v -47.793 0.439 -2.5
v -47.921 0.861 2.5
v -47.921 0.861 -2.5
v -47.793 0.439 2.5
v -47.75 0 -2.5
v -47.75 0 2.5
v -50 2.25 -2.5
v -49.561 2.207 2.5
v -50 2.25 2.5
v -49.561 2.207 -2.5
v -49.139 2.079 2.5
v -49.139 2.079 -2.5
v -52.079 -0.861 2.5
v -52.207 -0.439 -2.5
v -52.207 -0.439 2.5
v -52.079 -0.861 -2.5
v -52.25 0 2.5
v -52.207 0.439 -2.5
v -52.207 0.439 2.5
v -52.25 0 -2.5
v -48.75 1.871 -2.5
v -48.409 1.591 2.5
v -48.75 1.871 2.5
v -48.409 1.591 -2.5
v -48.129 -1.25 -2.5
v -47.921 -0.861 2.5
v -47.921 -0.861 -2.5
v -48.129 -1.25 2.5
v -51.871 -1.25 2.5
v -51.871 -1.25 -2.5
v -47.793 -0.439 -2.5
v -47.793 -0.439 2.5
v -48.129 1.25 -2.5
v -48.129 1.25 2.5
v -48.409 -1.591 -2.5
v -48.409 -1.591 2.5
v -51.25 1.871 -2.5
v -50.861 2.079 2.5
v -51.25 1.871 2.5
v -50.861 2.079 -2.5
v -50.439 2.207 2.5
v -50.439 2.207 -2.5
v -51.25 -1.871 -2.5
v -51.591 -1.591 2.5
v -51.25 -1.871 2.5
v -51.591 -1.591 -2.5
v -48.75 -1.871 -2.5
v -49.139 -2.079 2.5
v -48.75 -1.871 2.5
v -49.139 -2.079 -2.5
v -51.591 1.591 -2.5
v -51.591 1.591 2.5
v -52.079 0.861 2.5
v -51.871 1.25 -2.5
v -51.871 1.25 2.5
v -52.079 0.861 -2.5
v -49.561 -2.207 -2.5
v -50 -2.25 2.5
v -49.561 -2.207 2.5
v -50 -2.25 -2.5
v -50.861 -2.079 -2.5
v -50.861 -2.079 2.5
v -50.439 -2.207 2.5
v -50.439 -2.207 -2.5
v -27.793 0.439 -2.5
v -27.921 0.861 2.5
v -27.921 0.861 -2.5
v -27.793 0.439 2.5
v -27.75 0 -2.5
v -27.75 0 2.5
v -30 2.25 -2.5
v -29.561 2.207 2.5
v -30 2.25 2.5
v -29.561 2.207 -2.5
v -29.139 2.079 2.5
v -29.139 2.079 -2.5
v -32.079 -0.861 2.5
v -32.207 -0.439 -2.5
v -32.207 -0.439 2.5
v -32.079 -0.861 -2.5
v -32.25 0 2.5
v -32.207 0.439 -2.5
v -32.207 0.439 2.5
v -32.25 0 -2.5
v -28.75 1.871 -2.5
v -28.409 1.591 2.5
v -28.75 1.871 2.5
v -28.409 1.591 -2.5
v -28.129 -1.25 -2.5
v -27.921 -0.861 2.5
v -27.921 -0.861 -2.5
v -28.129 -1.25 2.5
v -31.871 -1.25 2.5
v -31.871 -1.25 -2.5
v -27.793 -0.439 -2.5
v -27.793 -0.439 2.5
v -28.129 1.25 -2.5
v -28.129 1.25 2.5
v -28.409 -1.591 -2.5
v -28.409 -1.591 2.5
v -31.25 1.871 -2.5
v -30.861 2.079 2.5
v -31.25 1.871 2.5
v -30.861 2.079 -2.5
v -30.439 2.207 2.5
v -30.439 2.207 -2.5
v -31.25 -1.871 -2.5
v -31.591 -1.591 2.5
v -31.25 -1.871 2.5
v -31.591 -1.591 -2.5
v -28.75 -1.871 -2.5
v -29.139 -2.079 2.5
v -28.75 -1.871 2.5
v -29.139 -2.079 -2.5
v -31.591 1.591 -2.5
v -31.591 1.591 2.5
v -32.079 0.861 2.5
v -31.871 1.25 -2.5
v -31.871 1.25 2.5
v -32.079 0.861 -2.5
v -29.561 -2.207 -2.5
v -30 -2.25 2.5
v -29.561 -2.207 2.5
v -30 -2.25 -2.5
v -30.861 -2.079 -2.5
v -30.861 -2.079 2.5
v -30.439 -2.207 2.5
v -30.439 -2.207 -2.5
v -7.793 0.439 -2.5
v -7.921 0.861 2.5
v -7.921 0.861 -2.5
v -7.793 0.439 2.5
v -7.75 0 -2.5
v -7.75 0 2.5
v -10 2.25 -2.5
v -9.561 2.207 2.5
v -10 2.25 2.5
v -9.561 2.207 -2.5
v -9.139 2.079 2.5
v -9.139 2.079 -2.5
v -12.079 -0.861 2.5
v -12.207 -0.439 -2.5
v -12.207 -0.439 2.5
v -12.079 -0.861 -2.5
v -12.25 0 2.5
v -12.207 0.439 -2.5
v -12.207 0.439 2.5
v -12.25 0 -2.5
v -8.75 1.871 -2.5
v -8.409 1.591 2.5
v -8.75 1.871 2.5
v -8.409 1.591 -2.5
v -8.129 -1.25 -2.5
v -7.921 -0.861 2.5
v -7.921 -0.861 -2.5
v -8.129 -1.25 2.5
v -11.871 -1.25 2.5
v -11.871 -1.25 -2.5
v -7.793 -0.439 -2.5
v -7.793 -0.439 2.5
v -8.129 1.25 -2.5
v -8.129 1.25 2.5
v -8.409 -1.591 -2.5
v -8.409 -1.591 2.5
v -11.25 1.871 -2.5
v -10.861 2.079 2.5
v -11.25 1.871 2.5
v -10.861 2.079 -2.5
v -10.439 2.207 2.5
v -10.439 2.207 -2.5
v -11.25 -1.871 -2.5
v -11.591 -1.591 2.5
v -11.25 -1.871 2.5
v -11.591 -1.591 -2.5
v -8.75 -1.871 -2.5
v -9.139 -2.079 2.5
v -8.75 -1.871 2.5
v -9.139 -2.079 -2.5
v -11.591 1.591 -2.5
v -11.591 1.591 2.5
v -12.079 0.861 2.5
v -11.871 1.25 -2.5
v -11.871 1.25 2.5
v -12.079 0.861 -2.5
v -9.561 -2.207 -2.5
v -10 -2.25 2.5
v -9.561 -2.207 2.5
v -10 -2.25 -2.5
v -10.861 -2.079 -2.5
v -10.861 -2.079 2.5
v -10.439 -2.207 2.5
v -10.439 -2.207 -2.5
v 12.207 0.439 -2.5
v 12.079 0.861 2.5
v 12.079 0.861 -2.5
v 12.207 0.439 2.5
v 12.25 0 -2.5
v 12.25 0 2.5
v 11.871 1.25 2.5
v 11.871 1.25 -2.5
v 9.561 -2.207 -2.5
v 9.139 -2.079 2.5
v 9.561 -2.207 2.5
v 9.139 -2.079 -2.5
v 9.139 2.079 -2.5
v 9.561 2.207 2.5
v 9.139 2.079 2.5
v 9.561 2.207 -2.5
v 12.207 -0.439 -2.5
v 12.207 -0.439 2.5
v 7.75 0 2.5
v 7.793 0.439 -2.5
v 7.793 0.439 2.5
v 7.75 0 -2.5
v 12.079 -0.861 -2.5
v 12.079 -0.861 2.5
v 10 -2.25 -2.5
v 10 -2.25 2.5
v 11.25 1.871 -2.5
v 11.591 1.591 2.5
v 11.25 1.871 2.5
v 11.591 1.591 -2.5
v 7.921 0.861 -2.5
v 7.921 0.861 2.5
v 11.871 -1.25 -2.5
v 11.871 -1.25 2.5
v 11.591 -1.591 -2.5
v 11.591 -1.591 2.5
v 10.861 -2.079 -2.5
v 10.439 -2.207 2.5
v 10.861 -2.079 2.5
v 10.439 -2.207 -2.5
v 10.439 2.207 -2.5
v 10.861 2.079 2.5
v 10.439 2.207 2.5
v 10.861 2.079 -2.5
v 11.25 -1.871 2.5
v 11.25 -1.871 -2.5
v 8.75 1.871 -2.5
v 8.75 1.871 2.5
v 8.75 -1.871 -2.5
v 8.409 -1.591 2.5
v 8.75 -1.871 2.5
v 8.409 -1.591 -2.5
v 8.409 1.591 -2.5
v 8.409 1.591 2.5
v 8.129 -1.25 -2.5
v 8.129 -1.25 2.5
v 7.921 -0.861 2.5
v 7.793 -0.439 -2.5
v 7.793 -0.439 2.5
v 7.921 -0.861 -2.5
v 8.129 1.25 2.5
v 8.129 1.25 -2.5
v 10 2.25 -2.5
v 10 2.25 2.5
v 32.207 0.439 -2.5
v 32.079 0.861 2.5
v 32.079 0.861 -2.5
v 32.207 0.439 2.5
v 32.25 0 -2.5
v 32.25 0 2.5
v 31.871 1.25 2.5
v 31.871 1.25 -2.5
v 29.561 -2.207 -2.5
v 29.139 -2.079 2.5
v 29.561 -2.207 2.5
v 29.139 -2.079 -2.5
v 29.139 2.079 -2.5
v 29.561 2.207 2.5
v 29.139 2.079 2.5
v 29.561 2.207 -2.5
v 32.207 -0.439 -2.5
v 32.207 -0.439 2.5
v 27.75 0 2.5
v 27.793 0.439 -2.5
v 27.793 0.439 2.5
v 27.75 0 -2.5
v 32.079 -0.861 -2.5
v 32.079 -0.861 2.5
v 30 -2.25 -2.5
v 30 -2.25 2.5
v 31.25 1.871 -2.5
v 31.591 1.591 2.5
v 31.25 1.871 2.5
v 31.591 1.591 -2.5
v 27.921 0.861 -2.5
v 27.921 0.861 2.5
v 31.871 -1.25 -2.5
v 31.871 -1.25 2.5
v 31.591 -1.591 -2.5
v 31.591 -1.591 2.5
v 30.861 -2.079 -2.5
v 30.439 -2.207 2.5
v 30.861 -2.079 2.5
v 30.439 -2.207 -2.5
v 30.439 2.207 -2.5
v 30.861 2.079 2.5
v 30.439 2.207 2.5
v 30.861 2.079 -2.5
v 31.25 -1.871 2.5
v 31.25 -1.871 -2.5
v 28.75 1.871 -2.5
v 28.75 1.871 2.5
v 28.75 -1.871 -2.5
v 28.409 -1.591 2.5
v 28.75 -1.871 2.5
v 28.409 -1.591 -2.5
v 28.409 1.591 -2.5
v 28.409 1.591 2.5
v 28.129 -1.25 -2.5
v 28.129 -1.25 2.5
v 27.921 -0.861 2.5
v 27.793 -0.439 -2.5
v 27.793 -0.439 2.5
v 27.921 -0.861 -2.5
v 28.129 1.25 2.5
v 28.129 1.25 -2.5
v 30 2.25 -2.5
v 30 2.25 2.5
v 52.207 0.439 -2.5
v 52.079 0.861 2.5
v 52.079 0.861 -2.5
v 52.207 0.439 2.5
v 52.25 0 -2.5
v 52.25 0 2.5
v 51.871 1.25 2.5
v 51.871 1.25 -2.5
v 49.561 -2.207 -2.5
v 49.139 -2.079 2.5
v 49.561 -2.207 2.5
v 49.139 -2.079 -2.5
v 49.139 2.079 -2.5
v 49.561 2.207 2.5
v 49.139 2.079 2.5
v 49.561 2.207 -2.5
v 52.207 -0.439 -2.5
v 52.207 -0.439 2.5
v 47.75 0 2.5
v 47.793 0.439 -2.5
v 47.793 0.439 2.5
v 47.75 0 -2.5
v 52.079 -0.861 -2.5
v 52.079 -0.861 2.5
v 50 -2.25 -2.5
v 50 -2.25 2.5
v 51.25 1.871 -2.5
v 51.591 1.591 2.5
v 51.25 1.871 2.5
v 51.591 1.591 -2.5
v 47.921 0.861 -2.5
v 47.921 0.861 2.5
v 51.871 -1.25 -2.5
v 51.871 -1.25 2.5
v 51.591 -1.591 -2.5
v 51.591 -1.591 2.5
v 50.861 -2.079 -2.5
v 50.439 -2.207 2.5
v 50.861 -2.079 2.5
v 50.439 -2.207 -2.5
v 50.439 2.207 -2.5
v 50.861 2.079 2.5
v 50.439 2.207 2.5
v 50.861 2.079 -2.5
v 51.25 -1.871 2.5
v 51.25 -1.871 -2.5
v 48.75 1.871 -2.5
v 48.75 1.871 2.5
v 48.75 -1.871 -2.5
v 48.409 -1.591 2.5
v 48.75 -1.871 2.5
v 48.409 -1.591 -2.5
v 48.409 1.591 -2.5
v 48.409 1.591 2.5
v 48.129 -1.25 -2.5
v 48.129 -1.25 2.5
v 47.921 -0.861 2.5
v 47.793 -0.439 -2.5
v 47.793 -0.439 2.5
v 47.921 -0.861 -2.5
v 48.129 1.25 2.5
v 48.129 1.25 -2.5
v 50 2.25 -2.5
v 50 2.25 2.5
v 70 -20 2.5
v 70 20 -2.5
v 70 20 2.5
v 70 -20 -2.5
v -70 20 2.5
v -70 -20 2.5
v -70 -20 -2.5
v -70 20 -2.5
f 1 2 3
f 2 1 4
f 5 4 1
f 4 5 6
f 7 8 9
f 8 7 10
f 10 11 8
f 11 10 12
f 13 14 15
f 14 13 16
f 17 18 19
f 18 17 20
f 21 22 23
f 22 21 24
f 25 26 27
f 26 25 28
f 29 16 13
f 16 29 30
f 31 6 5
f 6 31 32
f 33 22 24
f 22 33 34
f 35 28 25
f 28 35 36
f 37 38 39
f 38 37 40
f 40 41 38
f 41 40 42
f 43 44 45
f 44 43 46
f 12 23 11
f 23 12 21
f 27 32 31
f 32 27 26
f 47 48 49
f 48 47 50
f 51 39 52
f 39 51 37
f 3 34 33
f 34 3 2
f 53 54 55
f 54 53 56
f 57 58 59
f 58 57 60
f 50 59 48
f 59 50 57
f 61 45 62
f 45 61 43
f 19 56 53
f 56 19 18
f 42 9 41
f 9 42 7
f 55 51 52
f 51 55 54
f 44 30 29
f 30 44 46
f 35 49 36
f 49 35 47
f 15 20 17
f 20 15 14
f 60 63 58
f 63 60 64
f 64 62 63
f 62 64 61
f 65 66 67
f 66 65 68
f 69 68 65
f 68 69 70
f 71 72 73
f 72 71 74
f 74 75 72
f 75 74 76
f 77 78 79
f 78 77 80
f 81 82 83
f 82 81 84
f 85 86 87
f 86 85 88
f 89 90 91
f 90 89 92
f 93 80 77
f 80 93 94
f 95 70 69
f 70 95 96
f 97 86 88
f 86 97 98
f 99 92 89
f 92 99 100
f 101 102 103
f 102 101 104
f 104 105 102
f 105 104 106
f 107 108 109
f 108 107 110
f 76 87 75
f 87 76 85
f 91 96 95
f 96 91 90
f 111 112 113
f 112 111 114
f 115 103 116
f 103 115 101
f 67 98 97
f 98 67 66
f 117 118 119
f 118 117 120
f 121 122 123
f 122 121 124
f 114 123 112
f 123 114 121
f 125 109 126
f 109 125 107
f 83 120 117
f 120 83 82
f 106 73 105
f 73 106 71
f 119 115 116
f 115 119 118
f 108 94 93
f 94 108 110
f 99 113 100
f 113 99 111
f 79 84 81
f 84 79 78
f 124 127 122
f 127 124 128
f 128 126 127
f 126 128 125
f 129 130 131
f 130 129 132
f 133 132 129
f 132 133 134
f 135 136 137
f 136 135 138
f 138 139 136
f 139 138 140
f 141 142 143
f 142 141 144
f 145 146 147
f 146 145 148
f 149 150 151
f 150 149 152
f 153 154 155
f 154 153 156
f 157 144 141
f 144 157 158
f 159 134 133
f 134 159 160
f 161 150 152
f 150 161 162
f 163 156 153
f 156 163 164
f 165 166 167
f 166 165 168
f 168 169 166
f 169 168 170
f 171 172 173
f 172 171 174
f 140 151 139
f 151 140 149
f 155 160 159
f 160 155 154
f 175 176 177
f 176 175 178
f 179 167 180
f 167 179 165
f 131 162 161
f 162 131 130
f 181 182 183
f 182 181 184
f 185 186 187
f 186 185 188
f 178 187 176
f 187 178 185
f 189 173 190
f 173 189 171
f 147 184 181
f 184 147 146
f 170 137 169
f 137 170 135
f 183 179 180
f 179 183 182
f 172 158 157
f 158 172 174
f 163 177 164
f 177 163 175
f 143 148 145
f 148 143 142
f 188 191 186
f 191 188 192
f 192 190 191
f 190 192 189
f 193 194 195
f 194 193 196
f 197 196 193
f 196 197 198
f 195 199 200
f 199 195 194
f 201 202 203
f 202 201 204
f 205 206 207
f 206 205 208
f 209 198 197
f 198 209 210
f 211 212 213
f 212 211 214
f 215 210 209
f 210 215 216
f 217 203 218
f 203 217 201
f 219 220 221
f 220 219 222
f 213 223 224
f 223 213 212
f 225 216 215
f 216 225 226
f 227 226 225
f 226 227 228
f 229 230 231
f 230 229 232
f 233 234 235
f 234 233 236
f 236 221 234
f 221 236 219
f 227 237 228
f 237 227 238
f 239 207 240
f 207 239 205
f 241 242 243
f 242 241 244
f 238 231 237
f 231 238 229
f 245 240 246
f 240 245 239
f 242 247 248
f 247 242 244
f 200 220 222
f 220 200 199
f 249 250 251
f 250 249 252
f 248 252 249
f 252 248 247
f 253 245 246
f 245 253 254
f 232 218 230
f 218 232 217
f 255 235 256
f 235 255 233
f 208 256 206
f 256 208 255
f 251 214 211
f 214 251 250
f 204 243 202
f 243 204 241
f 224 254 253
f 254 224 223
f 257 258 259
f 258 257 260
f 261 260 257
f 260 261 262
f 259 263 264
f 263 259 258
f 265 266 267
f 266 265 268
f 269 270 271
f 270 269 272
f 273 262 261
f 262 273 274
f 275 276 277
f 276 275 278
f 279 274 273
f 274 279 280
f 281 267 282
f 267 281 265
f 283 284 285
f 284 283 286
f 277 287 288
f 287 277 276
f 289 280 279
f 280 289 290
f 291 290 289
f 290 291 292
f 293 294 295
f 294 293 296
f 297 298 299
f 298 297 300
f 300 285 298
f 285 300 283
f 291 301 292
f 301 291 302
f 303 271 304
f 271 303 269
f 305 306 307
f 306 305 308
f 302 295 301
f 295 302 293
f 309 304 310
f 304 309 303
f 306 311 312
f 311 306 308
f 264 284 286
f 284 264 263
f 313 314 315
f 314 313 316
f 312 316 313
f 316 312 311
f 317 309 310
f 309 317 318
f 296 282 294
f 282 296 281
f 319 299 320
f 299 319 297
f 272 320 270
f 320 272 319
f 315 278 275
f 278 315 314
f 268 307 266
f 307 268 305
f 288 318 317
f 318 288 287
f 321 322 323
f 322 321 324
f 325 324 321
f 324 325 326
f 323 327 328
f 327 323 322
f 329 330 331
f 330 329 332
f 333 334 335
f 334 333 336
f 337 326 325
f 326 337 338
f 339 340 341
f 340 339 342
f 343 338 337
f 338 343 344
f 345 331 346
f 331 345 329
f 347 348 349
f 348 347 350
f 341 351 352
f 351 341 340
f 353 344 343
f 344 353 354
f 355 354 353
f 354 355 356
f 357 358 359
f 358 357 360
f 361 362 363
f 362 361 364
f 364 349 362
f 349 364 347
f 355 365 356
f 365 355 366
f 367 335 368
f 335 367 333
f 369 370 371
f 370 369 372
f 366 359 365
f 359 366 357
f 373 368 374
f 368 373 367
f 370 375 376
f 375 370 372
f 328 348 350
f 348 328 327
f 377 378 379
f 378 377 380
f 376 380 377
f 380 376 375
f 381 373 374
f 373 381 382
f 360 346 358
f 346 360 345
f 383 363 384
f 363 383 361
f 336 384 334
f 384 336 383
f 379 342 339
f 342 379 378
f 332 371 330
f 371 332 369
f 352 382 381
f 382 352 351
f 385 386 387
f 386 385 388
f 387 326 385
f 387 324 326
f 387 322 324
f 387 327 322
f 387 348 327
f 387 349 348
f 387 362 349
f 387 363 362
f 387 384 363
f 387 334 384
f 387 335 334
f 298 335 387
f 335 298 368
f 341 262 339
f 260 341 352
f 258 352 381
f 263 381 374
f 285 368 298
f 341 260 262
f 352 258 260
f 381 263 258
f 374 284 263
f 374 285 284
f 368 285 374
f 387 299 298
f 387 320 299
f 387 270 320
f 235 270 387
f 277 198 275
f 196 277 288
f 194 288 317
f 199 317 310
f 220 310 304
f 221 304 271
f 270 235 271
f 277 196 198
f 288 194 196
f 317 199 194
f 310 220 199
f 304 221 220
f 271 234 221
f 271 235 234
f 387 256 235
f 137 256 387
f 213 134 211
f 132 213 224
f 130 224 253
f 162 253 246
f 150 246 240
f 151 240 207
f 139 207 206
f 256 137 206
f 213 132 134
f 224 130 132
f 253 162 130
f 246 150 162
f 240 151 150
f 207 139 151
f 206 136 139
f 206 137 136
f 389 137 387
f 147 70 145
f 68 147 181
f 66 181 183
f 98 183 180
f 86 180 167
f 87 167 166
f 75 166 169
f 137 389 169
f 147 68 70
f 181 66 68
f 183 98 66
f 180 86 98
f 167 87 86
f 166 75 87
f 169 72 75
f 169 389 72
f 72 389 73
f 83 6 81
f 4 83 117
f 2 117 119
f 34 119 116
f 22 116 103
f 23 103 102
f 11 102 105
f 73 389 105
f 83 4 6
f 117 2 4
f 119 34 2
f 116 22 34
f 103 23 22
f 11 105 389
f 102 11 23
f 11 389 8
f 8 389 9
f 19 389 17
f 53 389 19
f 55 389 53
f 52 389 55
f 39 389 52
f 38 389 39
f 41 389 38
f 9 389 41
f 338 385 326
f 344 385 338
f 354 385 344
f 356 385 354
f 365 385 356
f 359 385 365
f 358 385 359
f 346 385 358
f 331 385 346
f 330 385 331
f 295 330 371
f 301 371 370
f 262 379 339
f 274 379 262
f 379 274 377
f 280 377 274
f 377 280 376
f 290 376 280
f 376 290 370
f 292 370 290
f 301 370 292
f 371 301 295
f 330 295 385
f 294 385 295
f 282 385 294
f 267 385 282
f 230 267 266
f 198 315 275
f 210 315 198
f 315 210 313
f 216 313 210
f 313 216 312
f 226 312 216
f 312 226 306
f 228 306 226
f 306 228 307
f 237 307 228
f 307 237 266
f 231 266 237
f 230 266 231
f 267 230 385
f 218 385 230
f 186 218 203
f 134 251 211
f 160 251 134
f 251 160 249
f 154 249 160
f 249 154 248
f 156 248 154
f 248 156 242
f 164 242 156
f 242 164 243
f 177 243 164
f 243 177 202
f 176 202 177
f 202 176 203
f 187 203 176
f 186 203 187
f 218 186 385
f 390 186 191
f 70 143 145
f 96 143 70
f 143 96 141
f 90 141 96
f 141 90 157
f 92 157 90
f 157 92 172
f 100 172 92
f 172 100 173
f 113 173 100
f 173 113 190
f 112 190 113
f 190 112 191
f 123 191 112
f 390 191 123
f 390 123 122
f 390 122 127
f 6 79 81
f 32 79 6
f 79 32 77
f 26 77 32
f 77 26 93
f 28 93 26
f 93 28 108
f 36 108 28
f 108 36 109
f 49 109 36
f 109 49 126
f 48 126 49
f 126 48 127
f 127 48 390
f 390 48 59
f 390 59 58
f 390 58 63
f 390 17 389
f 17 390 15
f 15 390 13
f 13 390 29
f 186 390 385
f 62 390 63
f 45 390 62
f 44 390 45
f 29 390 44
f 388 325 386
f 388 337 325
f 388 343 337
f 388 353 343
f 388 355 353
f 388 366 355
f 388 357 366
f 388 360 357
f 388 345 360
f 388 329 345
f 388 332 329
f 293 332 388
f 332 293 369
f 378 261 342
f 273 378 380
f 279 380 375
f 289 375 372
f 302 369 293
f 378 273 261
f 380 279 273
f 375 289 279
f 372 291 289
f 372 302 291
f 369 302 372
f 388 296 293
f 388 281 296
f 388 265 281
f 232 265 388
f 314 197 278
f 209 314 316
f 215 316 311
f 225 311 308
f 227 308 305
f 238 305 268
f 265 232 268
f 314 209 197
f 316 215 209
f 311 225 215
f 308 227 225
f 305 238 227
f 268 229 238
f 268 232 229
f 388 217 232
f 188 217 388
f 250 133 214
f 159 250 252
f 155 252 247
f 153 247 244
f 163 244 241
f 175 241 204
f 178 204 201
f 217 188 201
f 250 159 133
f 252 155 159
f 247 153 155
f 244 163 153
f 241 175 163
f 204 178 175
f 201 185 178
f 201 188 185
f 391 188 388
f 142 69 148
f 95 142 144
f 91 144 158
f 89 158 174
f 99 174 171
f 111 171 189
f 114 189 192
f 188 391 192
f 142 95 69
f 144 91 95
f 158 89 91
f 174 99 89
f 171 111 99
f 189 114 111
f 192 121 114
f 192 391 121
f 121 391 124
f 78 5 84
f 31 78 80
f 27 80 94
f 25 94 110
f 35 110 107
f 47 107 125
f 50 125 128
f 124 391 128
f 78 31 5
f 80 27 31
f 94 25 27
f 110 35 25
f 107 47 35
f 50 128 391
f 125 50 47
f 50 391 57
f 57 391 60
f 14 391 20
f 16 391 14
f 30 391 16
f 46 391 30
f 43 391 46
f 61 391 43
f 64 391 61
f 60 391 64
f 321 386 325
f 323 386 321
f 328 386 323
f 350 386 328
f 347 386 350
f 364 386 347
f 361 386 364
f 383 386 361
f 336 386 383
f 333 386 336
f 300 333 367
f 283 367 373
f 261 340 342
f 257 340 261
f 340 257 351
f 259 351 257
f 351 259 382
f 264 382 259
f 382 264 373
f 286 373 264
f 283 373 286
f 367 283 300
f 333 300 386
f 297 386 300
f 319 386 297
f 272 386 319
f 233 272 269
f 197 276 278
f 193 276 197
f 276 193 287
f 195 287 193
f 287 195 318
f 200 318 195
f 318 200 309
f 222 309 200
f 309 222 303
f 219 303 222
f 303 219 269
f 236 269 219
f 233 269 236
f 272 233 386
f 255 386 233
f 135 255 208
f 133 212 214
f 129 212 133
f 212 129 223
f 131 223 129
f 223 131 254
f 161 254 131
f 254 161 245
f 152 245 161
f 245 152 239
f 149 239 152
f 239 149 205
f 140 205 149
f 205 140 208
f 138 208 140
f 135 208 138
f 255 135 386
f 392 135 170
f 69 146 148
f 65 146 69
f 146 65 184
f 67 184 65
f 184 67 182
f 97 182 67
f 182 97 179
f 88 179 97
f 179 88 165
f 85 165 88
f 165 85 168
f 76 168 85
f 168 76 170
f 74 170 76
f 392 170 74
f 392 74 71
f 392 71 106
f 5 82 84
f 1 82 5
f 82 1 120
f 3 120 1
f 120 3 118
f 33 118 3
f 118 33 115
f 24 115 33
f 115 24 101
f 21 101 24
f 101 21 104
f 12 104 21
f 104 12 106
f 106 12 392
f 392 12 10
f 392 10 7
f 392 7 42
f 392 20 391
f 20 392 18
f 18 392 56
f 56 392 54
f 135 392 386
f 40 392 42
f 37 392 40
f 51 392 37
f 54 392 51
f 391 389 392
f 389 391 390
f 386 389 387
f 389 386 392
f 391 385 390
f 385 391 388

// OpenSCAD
$fn = 32;

// ----------------------------------------------------------------------
// Hole bar, 6 x Ø4.5
// row layout, 20 mm edge offset
// ----------------------------------------------------------------------

// --- parameters (mm) ---
bar_w = 40;    // bar width (Y)
bar_t = 5;     // bar thickness (Z)
holes = 6;     // holes per row
hole_d = 4.5;  // hole diameter
edge = 20;     // offset from the bar end to the first hole
pitch = 20;    // pitch between neighbouring holes

// --- derived feature positions (mm) ---
span = (holes - 1) * pitch;   // = 100   distance between the end holes
bar_l = span + 2 * edge;      // = 140   overall bar length
start_x = -bar_l / 2 + edge;  // = -50   X of the first hole
feature_centers = [
  [start_x + 0 * pitch, 0],
  [start_x + 1 * pitch, 0],
  [start_x + 2 * pitch, 0],
  [start_x + 3 * pitch, 0],
  [start_x + 4 * pitch, 0],
  [start_x + 5 * pitch, 0]
];   // hole centres of the first row

// bar with one row of holes, drilled from feature_centers
difference() {
  translate([-bar_l / 2, -bar_w / 2, -bar_t / 2]) cube([bar_l, bar_w, bar_t]);
  for (centre = feature_centers)
    translate([centre[0], centre[1], 0])
      cylinder(d = hole_d, h = bar_t + 2, center = true);
}
